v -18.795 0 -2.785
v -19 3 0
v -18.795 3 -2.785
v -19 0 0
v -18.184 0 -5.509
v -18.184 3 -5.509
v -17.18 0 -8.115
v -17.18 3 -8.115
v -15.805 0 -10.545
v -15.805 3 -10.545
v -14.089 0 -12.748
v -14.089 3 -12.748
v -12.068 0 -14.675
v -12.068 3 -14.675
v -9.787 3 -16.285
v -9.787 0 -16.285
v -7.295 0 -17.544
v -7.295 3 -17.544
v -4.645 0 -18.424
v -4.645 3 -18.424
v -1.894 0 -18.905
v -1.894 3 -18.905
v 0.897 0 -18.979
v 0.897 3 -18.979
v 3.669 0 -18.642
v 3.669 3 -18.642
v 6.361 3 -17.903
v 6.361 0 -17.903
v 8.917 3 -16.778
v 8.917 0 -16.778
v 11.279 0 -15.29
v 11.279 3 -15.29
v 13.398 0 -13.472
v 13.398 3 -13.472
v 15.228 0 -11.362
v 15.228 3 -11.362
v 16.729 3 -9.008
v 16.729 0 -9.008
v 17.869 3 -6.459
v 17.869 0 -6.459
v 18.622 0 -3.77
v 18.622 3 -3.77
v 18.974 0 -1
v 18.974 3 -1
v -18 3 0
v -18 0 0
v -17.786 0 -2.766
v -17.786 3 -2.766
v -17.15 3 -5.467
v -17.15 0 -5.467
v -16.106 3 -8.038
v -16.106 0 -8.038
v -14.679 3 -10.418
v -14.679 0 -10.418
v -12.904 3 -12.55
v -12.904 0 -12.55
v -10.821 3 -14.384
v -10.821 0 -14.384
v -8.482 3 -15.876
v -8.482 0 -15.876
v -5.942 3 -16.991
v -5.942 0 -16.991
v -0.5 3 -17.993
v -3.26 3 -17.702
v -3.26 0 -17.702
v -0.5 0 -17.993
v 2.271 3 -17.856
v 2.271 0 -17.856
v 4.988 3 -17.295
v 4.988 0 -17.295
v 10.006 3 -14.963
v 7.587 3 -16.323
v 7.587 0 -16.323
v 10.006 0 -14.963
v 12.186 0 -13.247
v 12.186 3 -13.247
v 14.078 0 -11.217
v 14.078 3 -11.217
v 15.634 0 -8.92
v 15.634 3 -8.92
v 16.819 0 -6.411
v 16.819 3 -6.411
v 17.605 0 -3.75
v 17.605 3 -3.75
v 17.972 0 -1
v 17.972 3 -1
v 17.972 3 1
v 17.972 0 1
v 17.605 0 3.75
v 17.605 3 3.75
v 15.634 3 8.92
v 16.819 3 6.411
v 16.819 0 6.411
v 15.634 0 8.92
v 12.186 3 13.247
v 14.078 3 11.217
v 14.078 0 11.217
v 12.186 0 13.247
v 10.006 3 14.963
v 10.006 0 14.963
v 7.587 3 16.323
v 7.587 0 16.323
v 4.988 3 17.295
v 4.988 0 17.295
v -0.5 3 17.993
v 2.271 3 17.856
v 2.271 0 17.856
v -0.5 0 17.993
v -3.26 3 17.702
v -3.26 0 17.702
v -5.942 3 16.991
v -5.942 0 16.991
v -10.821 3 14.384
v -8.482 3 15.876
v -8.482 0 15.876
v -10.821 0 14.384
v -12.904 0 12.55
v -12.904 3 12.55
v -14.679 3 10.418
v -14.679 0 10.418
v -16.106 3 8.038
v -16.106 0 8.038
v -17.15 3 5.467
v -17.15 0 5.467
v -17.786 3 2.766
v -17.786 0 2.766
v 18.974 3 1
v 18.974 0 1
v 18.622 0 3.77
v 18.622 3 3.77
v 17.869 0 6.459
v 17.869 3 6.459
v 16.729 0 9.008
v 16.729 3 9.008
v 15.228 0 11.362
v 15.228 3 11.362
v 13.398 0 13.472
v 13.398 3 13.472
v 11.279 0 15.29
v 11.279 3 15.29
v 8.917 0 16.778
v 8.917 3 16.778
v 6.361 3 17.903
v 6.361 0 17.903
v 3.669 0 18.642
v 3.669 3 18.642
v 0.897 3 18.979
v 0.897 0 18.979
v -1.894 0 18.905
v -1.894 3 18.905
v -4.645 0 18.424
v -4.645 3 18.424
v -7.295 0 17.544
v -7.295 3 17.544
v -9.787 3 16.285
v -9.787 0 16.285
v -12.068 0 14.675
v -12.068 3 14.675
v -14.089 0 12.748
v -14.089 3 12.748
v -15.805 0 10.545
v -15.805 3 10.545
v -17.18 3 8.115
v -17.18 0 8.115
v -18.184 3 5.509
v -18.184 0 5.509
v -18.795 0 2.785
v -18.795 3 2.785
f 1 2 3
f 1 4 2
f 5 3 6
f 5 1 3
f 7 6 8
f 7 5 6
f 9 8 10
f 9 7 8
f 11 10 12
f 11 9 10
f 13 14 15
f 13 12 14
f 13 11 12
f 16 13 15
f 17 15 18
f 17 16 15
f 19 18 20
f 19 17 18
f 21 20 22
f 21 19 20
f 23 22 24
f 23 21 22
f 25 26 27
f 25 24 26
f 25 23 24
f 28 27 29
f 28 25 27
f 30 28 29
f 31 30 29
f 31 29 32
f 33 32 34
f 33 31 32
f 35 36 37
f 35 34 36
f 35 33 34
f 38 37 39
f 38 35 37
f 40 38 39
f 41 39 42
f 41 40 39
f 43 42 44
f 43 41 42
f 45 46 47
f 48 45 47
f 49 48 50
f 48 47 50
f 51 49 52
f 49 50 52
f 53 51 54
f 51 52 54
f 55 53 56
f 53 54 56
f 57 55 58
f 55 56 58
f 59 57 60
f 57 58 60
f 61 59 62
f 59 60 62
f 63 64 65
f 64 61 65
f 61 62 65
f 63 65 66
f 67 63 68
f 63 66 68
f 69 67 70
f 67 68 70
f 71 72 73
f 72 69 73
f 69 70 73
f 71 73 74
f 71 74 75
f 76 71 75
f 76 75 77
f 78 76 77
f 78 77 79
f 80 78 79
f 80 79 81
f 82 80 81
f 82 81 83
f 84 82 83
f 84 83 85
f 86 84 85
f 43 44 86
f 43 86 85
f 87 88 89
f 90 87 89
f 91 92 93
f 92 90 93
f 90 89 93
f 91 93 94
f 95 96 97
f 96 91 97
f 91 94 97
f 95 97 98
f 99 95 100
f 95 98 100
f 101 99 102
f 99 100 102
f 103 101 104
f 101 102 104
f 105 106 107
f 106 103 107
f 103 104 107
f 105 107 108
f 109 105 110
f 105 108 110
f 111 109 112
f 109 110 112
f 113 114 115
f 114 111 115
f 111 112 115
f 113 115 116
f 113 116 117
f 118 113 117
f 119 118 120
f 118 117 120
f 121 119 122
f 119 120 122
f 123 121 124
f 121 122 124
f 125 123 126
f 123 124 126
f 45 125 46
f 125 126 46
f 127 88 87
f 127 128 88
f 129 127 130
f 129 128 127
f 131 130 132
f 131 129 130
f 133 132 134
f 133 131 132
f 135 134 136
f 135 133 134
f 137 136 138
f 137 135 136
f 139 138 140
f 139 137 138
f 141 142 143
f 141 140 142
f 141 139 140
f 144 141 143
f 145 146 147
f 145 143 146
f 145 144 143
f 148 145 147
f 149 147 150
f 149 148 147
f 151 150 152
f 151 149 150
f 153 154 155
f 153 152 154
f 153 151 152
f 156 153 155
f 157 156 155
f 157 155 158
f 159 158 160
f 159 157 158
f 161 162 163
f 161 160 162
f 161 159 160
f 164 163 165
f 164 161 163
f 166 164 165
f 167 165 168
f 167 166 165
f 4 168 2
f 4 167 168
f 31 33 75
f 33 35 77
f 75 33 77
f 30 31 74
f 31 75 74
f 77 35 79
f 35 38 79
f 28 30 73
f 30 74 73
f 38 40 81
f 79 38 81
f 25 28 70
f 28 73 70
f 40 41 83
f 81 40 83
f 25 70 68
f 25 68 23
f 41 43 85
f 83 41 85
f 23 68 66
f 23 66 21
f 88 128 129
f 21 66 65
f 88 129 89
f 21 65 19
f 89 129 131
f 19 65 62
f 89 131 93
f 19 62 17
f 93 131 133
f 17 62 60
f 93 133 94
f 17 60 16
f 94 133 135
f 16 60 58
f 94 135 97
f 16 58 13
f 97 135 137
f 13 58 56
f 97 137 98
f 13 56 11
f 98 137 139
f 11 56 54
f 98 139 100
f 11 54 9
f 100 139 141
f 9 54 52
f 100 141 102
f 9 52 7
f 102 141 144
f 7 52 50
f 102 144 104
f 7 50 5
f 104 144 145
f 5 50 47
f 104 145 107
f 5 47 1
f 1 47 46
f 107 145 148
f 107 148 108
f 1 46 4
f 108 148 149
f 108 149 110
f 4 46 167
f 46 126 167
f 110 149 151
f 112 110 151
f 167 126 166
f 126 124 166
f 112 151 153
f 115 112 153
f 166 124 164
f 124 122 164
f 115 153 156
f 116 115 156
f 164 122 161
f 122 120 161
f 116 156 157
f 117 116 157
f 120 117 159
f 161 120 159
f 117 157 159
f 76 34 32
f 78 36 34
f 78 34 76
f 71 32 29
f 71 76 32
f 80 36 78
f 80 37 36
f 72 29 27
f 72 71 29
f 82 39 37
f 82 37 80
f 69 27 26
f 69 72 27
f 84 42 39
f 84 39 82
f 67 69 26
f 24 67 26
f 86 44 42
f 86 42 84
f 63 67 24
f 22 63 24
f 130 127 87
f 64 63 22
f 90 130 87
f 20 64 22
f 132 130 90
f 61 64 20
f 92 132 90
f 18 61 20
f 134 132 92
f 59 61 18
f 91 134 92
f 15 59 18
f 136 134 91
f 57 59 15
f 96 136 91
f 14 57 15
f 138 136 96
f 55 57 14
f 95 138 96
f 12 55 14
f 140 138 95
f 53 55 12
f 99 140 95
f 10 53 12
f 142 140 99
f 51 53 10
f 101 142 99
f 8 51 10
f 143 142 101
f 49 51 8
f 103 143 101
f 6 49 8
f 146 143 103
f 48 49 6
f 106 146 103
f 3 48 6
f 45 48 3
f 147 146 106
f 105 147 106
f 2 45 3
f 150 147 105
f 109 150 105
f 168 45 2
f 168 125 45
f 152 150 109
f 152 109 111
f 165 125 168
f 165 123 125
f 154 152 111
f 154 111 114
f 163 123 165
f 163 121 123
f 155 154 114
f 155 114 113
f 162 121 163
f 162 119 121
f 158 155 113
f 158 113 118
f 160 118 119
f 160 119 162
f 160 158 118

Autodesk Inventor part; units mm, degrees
ref_plane "XZ Plane" through (0, 0, 0) normal (0, 1, 0) x (-1, 0, 0)
ref_plane "XY Plane" through (0, 0, 0) normal (0, 0, 1) x (1, 0, 0)
sketch "Sketch1" plane through (0, 0, 0) normal (0, 1, 0) x (-1, 0, 0)
  circle A0 centre (0, 0) radius 19
  circle A1 centre (0, 0) radius 18
  dimension "d0" = 38
  dimension "d1" = 36
extrude "Extrusion1" add sketch "Sketch1" along normal blind 3
ref_plane "Work Plane1" through (19, 0, 0) normal (1, 0, 0) x (0, 1, 0)
sketch "Sketch2" plane through (19, 0, 0) normal (1, 0, 0) x (0, 1, 0)
  line L0 (0, 1) -> (5, 1)
  line L1 (5, 1) -> (5, -1)
  line L2 (5, -1) -> (0, -1)
  line L3 (0, -1) -> (0, 1)
  point P0 (0, 0)
  dimension "d4" = 1
  dimension "d5" = 1
  dimension "d6" = 0
  dimension "d7" = 5
extrude "Extrusion2" cut sketch "Sketch2" against normal blind 5
equation "\"d5\" = d4"
properties part number "ringLoop" material "Copper"
